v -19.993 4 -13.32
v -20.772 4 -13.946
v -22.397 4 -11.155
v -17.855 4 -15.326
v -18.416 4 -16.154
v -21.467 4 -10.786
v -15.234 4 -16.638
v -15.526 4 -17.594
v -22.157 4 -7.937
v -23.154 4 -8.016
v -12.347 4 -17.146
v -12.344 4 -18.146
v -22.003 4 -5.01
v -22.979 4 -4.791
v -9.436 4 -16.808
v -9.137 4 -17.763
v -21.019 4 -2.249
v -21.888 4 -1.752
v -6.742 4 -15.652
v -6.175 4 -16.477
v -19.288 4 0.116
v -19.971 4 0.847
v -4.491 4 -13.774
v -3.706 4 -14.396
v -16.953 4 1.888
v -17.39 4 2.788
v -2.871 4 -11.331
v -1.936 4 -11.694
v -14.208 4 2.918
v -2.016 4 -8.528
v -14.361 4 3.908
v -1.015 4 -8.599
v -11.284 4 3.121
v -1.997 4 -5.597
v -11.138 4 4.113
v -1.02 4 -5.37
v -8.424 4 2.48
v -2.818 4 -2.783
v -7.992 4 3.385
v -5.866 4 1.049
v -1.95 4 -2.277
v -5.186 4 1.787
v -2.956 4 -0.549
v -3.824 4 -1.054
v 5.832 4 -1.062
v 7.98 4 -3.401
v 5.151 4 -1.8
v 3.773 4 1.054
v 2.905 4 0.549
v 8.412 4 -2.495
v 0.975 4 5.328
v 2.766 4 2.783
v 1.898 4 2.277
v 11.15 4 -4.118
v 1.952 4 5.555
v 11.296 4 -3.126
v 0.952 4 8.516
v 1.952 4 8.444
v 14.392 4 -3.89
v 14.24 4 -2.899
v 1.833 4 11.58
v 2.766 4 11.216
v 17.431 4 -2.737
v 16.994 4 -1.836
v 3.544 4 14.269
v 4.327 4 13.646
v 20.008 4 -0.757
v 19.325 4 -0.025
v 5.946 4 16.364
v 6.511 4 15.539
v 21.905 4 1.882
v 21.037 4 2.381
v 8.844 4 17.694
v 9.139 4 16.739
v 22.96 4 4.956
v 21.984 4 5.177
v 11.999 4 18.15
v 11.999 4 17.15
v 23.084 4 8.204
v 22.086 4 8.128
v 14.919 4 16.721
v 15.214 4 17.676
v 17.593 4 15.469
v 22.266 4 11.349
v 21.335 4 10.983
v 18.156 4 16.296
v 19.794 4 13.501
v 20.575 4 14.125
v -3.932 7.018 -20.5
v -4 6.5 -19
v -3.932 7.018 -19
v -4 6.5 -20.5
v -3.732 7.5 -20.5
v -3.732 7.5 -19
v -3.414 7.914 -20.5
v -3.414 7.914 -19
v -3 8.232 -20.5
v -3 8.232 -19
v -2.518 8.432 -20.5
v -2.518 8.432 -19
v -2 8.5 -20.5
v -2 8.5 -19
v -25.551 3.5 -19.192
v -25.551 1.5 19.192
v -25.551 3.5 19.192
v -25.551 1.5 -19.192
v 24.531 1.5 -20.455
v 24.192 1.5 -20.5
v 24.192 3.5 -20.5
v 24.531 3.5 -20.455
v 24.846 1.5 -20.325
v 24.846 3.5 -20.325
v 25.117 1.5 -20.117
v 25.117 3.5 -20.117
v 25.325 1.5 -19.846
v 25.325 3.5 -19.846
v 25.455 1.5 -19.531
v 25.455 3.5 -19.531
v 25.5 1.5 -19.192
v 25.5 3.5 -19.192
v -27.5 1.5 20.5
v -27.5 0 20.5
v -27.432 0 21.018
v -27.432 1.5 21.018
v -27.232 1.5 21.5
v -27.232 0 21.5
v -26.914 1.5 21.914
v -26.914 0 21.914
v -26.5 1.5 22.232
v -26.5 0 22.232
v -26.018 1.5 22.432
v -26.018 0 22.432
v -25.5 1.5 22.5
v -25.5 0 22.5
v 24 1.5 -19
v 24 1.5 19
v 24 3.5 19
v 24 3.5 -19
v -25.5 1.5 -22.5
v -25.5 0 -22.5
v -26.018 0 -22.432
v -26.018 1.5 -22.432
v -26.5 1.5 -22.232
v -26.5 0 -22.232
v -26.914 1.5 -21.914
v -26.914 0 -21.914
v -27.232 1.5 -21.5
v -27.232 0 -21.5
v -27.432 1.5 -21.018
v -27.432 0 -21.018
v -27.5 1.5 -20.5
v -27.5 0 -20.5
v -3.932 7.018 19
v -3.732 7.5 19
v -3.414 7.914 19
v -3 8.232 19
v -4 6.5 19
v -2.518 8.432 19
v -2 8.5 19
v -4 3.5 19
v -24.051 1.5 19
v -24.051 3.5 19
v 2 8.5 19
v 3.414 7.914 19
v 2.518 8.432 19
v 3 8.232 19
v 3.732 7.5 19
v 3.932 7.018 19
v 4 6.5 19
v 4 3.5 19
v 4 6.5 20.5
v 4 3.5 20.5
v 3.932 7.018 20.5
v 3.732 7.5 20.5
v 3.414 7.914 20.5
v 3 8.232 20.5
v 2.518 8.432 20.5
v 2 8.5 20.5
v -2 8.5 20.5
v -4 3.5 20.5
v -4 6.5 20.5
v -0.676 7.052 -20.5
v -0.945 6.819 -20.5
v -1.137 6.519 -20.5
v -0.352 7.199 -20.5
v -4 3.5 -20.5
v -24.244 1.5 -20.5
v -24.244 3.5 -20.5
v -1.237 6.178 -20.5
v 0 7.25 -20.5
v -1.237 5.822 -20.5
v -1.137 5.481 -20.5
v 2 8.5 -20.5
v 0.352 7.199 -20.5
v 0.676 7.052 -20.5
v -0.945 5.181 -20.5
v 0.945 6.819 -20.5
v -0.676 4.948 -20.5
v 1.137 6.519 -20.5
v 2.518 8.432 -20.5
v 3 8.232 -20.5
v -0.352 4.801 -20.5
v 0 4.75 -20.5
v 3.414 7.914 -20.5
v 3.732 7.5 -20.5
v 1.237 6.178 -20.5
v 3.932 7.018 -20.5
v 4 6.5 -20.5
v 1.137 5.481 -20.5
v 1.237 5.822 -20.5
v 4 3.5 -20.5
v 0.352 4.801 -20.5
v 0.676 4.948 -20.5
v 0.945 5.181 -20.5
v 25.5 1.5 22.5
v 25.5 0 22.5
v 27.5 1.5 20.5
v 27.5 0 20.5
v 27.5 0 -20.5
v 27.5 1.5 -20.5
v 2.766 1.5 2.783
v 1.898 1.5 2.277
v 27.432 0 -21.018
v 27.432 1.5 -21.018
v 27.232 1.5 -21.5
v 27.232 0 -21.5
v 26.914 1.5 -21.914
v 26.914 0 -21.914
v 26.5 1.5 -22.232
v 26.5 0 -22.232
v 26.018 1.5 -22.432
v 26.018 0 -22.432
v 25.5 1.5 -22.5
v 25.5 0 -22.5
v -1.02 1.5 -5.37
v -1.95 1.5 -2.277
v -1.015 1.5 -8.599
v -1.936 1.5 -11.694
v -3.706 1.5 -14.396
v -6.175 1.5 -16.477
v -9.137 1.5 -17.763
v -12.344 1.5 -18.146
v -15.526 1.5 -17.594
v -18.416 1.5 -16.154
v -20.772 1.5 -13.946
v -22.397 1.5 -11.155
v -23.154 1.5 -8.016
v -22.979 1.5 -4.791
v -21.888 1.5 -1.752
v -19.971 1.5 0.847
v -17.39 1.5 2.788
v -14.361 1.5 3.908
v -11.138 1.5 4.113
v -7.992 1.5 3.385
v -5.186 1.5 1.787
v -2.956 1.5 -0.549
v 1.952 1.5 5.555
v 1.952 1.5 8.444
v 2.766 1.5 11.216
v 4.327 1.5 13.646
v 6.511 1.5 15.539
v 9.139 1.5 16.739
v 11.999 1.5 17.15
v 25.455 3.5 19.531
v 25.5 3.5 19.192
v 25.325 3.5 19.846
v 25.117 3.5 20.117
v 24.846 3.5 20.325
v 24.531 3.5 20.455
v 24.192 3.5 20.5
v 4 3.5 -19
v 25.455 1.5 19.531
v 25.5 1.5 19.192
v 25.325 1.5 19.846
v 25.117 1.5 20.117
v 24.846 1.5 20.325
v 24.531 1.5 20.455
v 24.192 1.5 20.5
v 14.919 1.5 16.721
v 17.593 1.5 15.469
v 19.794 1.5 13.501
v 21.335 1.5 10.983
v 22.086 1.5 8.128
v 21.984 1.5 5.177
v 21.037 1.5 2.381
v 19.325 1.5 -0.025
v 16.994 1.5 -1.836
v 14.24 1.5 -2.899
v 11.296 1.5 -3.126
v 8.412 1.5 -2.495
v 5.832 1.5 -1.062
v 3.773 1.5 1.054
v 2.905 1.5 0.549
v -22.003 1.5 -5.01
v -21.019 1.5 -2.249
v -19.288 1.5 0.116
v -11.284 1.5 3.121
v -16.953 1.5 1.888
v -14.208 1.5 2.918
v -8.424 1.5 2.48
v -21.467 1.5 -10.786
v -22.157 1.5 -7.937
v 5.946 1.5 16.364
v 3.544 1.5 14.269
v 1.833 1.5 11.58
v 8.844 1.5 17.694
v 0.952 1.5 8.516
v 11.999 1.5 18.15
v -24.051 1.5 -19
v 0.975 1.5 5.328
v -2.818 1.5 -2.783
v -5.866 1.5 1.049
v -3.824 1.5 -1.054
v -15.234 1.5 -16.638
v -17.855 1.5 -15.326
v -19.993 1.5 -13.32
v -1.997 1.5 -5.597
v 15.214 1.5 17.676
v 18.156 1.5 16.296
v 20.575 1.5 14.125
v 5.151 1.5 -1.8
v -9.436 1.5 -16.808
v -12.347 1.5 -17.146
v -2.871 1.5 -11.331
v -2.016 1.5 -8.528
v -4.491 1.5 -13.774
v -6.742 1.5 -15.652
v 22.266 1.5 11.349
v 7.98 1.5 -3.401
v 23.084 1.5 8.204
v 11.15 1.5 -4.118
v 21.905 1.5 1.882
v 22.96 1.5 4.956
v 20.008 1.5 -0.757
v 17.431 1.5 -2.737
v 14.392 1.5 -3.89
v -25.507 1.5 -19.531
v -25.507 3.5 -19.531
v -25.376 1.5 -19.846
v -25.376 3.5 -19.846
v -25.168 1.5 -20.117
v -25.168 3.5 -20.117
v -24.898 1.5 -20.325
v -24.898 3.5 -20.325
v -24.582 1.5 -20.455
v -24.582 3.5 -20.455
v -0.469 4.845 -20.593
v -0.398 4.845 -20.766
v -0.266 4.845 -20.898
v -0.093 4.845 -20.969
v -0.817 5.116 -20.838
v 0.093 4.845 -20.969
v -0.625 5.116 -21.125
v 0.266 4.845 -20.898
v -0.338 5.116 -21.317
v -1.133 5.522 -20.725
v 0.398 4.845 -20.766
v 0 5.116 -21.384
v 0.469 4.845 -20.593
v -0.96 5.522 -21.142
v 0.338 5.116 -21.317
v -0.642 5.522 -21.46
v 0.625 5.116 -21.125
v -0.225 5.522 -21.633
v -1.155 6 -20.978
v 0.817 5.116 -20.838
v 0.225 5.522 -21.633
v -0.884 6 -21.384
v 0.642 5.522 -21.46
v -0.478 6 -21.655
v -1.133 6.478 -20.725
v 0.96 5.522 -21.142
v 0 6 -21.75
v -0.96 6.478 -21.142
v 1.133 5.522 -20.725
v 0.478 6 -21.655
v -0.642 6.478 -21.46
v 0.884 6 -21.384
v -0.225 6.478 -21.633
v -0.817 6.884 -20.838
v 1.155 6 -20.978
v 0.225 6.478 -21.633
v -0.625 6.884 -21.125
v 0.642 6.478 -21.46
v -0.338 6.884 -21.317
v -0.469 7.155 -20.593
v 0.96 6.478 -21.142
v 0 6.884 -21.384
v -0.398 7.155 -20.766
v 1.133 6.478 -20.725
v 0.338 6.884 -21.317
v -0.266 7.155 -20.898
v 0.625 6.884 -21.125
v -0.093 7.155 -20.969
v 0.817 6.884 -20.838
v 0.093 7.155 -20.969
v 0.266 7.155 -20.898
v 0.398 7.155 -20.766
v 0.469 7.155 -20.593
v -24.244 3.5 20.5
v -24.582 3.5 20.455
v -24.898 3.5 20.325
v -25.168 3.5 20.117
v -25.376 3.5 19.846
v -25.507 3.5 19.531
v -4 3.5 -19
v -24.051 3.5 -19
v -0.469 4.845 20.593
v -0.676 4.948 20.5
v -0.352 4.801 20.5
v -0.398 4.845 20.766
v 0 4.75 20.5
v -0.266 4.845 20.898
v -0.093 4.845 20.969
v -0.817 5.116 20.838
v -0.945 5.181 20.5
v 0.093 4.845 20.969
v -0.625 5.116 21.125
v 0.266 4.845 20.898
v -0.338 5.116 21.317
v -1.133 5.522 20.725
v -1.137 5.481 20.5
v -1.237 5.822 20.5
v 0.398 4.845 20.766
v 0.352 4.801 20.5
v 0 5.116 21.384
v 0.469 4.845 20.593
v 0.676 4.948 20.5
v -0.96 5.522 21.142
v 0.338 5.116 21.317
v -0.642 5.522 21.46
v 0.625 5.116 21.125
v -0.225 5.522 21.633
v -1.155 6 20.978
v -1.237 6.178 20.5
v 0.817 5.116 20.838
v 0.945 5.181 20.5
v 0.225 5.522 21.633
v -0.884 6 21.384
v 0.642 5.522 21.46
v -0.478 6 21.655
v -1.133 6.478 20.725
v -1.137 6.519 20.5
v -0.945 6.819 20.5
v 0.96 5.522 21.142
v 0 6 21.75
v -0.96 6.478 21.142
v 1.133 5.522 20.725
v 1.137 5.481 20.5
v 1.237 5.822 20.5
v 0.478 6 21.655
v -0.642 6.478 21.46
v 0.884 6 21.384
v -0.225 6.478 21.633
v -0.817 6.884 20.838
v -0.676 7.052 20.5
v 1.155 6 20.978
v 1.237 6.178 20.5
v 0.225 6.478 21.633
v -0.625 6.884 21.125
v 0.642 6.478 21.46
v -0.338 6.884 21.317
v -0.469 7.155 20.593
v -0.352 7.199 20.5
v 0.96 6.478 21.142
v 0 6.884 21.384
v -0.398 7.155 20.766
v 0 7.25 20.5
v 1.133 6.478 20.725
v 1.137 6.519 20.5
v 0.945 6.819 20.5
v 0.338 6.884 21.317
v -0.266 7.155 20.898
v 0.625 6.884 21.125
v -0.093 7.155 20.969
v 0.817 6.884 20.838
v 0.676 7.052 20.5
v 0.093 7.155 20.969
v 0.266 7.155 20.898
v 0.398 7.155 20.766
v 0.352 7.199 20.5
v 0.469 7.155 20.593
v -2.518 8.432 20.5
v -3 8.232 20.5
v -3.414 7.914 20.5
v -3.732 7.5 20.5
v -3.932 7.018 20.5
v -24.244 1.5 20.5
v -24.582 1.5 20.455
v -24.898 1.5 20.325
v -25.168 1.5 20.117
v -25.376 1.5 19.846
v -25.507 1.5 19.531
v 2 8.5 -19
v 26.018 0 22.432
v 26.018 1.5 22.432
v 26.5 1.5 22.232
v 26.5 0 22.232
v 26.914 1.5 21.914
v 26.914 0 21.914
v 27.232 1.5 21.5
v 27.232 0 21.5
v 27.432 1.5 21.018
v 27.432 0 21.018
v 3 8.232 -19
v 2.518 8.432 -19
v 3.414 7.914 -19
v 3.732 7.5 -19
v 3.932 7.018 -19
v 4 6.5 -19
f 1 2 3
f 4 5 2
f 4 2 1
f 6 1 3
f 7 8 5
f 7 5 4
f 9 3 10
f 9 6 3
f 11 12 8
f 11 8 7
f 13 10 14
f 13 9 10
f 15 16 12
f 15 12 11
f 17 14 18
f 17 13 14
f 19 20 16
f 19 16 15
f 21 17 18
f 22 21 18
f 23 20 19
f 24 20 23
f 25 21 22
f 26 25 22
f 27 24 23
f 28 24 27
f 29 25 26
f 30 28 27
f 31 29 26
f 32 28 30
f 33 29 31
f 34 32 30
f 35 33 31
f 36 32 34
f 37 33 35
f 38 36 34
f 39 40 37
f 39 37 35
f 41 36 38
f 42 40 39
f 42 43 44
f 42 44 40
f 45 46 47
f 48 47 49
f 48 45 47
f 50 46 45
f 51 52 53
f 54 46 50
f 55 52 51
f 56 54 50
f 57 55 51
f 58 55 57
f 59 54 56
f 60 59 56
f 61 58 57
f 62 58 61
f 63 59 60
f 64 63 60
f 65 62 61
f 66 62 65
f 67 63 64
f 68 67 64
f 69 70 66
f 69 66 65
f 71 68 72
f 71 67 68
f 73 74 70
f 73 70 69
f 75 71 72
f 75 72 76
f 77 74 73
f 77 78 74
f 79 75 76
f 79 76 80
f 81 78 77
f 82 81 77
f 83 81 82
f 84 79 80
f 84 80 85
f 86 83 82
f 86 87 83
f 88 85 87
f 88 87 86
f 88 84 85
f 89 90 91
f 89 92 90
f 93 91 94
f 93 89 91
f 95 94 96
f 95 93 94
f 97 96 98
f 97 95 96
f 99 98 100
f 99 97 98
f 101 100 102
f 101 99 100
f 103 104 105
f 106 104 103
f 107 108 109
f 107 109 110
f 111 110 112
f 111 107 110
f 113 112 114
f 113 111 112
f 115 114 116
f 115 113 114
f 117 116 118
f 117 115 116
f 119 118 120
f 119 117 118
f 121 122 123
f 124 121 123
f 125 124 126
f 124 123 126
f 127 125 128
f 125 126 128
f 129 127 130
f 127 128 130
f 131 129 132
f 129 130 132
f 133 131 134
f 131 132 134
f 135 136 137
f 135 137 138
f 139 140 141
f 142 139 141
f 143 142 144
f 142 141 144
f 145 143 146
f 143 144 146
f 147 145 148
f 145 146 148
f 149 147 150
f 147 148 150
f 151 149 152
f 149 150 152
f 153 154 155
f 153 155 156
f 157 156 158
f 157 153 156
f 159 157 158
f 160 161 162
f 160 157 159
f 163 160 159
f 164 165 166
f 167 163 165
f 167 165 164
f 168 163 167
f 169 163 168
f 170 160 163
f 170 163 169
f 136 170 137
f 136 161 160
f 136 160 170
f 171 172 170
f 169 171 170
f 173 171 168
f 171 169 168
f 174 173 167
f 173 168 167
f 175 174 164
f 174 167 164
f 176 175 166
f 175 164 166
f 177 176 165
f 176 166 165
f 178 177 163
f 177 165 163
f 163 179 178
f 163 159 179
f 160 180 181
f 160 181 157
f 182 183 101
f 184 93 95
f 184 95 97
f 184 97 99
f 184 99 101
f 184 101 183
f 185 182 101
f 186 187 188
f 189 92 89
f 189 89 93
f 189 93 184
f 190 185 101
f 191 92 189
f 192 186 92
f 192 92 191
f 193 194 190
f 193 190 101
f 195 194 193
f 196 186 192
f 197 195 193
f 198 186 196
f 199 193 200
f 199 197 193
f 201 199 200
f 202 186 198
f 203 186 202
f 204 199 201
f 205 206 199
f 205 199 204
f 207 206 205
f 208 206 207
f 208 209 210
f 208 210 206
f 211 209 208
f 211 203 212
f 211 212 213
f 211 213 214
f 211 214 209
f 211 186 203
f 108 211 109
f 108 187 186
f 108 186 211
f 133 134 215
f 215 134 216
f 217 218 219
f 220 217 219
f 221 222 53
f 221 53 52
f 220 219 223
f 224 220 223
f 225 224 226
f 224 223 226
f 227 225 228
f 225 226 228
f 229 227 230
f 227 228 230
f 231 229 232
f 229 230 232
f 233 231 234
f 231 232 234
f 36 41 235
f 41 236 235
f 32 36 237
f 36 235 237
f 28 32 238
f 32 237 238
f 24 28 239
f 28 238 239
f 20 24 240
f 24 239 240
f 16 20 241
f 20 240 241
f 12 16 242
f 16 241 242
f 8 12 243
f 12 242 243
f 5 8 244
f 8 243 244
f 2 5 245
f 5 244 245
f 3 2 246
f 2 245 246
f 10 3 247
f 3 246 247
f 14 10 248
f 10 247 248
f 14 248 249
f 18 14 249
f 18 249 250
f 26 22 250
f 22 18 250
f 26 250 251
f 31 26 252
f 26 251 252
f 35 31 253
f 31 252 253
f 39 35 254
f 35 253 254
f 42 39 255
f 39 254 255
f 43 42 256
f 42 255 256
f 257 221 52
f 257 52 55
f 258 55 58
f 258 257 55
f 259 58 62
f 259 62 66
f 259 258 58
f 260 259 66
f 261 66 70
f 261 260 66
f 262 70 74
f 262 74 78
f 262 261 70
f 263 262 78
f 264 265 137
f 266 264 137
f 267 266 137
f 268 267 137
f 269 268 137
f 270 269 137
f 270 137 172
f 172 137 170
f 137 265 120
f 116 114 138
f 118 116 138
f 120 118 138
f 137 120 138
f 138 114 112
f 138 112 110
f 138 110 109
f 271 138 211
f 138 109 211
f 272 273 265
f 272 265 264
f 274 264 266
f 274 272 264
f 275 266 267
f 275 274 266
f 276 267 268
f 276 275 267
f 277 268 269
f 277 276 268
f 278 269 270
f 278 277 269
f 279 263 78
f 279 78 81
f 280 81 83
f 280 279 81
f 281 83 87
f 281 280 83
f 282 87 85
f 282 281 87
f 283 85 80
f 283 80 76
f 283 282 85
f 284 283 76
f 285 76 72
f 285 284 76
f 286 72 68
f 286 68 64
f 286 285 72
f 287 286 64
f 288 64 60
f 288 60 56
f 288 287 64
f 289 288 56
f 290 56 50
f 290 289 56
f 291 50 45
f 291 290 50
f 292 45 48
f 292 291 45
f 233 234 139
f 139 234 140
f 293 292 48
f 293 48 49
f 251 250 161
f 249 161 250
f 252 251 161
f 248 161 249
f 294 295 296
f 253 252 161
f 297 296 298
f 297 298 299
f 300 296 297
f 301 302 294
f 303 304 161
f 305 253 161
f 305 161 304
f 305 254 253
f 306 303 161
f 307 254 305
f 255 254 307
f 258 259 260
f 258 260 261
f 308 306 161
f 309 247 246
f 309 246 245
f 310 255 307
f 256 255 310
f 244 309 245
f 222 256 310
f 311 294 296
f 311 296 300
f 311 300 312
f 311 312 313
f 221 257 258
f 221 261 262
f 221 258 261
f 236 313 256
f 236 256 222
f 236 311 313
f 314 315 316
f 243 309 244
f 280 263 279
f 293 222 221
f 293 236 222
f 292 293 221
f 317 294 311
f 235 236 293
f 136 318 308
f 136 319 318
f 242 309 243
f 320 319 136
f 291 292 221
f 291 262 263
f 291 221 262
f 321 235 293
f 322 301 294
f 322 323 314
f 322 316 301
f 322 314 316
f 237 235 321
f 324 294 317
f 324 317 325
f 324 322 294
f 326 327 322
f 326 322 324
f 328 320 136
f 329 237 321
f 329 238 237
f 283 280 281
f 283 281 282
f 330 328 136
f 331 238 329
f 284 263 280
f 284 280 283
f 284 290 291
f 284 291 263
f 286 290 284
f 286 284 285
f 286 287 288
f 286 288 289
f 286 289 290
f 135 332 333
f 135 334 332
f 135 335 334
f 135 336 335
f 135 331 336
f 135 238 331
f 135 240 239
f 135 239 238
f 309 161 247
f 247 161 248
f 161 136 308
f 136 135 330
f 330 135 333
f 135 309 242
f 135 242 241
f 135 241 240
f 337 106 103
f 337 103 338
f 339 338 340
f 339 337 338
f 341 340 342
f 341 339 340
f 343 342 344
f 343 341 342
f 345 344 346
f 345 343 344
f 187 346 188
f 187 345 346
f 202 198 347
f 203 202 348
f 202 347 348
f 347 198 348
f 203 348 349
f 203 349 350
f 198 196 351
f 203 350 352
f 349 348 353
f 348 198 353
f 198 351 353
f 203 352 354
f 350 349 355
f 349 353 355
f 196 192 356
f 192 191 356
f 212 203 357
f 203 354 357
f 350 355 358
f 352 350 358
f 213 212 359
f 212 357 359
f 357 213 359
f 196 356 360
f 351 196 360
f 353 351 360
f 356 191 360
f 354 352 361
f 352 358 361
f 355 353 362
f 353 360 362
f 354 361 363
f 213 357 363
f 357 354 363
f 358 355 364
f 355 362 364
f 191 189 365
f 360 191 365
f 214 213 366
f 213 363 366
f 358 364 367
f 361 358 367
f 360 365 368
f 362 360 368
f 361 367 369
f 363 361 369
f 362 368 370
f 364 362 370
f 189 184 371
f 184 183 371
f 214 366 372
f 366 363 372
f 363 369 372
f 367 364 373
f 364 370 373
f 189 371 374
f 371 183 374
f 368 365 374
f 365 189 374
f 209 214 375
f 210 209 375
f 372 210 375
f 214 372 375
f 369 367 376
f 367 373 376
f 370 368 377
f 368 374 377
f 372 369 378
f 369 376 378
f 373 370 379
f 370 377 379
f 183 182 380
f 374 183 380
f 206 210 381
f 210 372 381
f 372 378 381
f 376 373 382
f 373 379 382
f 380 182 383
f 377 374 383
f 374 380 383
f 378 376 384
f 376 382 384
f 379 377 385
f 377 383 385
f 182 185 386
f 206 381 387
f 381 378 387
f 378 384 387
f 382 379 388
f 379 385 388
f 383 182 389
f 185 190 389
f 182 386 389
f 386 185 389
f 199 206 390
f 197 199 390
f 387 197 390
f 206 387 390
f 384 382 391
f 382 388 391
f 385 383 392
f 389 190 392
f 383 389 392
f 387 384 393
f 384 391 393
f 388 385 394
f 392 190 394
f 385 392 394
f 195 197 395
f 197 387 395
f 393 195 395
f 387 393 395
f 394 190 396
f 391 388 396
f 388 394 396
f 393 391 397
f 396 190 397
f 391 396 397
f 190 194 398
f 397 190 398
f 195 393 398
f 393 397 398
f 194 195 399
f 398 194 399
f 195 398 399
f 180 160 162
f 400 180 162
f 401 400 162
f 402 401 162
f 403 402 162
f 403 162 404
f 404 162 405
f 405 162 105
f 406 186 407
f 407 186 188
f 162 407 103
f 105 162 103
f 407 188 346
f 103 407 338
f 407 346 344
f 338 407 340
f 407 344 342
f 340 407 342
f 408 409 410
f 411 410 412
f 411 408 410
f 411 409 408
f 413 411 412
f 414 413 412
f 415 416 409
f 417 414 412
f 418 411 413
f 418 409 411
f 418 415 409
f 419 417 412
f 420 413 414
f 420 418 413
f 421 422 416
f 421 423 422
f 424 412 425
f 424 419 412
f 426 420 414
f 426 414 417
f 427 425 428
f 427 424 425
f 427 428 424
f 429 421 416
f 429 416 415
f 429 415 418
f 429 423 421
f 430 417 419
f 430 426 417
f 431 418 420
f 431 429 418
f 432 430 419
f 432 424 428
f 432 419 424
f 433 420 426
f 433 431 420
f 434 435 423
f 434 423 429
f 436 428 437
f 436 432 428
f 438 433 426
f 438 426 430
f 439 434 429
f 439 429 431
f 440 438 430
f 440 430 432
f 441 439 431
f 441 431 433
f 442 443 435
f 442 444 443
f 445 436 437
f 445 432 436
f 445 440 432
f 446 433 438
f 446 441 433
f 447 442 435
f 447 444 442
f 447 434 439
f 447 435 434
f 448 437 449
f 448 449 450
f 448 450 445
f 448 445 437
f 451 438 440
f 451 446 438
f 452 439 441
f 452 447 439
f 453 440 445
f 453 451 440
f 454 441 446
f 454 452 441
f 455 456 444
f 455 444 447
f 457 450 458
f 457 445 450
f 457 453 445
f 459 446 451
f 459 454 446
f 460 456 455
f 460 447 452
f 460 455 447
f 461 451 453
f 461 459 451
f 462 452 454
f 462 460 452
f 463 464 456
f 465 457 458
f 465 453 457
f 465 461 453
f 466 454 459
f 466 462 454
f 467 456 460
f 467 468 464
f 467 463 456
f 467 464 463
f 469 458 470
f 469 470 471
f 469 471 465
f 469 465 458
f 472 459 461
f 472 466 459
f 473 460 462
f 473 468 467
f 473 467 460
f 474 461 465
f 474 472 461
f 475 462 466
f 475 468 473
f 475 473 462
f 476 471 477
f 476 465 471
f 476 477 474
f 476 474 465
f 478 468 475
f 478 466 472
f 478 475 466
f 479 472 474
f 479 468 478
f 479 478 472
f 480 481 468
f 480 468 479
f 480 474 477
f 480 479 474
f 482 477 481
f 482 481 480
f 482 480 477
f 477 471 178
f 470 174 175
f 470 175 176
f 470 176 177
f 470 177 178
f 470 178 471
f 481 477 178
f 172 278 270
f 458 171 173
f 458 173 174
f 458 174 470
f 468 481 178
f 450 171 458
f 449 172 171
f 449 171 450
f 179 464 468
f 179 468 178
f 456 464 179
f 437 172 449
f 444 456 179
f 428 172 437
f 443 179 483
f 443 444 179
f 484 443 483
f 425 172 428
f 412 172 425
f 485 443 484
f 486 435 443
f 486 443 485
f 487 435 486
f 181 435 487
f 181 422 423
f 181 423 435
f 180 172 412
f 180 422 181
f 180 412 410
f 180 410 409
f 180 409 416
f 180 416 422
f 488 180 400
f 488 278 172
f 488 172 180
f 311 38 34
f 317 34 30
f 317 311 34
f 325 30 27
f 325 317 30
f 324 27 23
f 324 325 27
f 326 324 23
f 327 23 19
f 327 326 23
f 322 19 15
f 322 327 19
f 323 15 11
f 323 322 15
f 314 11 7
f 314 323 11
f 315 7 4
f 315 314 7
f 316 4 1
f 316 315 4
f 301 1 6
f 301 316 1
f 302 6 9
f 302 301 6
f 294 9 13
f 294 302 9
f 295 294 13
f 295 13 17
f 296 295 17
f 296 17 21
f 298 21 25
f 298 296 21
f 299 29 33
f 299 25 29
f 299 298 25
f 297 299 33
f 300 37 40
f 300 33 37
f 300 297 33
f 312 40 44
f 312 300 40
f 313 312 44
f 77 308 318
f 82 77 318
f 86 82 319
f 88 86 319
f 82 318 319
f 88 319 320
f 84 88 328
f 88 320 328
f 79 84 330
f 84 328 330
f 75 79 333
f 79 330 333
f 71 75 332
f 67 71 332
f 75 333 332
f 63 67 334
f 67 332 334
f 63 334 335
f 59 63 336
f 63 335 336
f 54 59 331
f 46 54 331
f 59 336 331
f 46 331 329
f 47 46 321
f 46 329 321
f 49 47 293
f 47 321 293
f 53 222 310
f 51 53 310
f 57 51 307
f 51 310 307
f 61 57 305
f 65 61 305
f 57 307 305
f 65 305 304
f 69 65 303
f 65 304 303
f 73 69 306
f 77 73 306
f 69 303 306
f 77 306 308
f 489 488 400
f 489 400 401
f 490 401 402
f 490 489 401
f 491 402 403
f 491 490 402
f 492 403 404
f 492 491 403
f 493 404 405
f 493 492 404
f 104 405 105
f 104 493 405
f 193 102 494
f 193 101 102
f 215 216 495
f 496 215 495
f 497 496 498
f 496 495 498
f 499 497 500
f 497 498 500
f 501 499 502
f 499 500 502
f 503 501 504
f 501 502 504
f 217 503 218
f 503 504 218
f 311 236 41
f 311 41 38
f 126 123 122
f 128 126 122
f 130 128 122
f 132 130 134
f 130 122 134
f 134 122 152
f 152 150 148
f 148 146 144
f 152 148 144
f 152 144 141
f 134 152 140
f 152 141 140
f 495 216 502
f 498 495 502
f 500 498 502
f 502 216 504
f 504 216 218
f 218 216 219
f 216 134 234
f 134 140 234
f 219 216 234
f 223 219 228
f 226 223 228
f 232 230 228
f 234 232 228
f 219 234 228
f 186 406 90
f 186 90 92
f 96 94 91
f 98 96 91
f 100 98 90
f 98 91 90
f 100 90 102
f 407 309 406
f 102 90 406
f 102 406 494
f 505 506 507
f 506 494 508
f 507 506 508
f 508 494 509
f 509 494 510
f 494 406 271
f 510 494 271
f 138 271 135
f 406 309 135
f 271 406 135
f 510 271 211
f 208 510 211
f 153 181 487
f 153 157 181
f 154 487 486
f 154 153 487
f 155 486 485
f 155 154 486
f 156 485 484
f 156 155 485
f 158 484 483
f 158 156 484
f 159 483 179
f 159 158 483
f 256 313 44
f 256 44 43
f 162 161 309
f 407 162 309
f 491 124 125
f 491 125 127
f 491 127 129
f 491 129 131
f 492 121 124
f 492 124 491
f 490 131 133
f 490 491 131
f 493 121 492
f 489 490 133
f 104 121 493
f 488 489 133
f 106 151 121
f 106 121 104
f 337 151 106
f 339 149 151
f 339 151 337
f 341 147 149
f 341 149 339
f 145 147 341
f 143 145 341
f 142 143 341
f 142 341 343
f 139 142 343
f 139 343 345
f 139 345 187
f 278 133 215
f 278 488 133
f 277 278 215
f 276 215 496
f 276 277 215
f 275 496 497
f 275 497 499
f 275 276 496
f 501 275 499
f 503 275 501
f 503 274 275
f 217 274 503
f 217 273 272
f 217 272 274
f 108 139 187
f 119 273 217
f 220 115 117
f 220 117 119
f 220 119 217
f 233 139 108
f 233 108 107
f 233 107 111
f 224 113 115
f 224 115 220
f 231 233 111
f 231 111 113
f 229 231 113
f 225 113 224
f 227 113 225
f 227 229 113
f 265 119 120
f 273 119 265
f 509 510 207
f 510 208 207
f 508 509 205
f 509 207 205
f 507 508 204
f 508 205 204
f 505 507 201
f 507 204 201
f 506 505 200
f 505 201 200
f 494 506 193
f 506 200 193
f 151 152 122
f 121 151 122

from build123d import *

# Parameters (mm, degrees)
SALIENTE_EXTRUIR1_DEPTH = 1.5
CROQUIS9_W              = 48.051342352
CROQUIS9_H              = 38
SALIENTE_EXTRUIR7_DEPTH = 2
CROQUIS10_W             = 8
CROQUIS10_H             = 1.5
SALIENTE_EXTRUIR8_DEPTH = 5
REDONDEO1_R             = 2
REVOLUCI_N1_ANGLE       = 180
CROQUIS14_R             = 11.15
CROQUIS14_R_2           = 10.15
SALIENTE_EXTRUIR9_DEPTH = 2.5
CORTAR_EXTRUIR4_DEPTH   = 2.5


with BuildPart() as part:
    # Croquis1 → Saliente-Extruir1 (new body)
    with BuildSketch(Plane(origin=(0, 0, 0), x_dir=(1, 0, 0), z_dir=(0, 1, 0))):
        with BuildLine():
            Line((-25.5, -22.5), (25.5, -22.5))
            ThreePointArc((25.5, -22.5), (26.914213562, -21.914213562), (27.5, -20.5))
            Line((27.5, -20.5), (27.5, 20.5))
            ThreePointArc((27.5, 20.5), (26.914213562, 21.914213562), (25.5, 22.5))
            Line((25.5, 22.5), (-25.5, 22.5))
            ThreePointArc((-25.5, 22.5), (-26.914213562, 21.914213562), (-27.5, 20.5))
            Line((-27.5, 20.5), (-27.5, -20.5))
            ThreePointArc((-27.5, -20.5), (-26.914213562, -21.914213562), (-25.5, -22.5))
        make_face()
    extrude(amount=SALIENTE_EXTRUIR1_DEPTH)

    # Croquis9 → Saliente-Extruir7 (add)
    with BuildSketch(Plane(origin=(0, 1.5, 0), x_dir=(1, 0, 0), z_dir=(0, 1, 0))):
        with BuildLine():
            Line((-24.243818065, 20.5), (24.192475714, 20.5))
            ThreePointArc((24.192475714, 20.5), (25.117035003, 20.117035003), (25.5, 19.192475714))
            Line((25.5, 19.192475714), (25.5, -19.192475714))
            ThreePointArc((25.5, -19.192475714), (25.117035003, -20.117035003), (24.192475714, -20.5))
            Line((24.192475714, -20.5), (-24.243818065, -20.5))
            ThreePointArc((-24.243818065, -20.5), (-25.168377355, -20.117035003), (-25.551342352, -19.192475714))
            Line((-25.551342352, -19.192475714), (-25.551342352, 19.192475714))
            ThreePointArc((-25.551342352, 19.192475714), (-25.168377355, 20.117035003), (-24.243818065, 20.5))
        make_face()
        with Locations((-0.025671176, 0)):
            Rectangle(CROQUIS9_W, CROQUIS9_H, mode=Mode.SUBTRACT)
    extrude(amount=SALIENTE_EXTRUIR7_DEPTH)

    # Croquis10 → Saliente-Extruir8 (add)
    with BuildSketch(Plane(origin=(0, 3.5, 0), x_dir=(1, 0, 0), z_dir=(0, 1, 0))):
        with Locations((0, 19.75)):
            Rectangle(CROQUIS10_W, CROQUIS10_H)
        with Locations((0, -19.75)):
            Rectangle(CROQUIS10_W, CROQUIS10_H)
    extrude(amount=SALIENTE_EXTRUIR8_DEPTH)

    # Redondeo1
    redondeo1_edges = [part.edges().sort_by_distance(p)[0] for p in [
        (-4, 8.5, -19.75),
        (4, 8.5, -19.75),
        (4, 8.5, 19.75),
        (-4, 8.5, 19.75),
    ]]
    fillet(redondeo1_edges, radius=REDONDEO1_R)

    # Croquis13 → Revolución1 (revolve)
    with BuildSketch(Plane.XY.offset(20.5)):
        with BuildLine():
            Line((0, 7.25), (0, 4.75))
            ThreePointArc((0, 4.75), (-1.25, 6), (0, 7.25))
        make_face()
    revoluci_n1 = revolve(axis=Axis((0, -1000, 20.5), (0, 1, 0)), revolution_arc=REVOLUCI_N1_ANGLE)

    # Simetría1: Revolución1 across plane
    add(revoluci_n1.mirror(Plane.XY))

    # Croquis14 → Saliente-Extruir9 (add)
    # profile 1 of 2: a face of its own
    with BuildSketch(Plane(origin=(0, 1.5, 0), x_dir=(1, 0, 0), z_dir=(0, 1, 0))):
        with Locations(Location((11.998657648, -7, 0), (0, 0, 270))):
            Circle(CROQUIS14_R)
        with Locations(Location((11.998657648, -7, 0), (0, 0, 270))):
            Circle(CROQUIS14_R_2, mode=Mode.SUBTRACT)
    # profile 2 of 2: a face of its own
    with BuildSketch(Plane(origin=(0, 1.5, 0), x_dir=(1, 0, 0), z_dir=(0, 1, 0))):
        with Locations(Location((-12.05, 7, 0), (0, 0, 270))):
            Circle(CROQUIS14_R)
        with Locations(Location((-12.05, 7, 0), (0, 0, 270))):
            Circle(CROQUIS14_R_2, mode=Mode.SUBTRACT)
    extrude(amount=SALIENTE_EXTRUIR9_DEPTH)

    # Croquis15 → Cortar-Extruir4 (cut)
    with BuildSketch(Plane(origin=(0, 1.5, 0), x_dir=(1, 0, 0), z_dir=(0, 1, 0))):
        Polygon((-12.553109789, 6.135777494), (11.495547859, -7.864222506), (12.501767438, -6.135777494), (-11.546890211, 7.864222506), align=None)
    extrude(amount=CORTAR_EXTRUIR4_DEPTH, mode=Mode.SUBTRACT)


solid = part.part
